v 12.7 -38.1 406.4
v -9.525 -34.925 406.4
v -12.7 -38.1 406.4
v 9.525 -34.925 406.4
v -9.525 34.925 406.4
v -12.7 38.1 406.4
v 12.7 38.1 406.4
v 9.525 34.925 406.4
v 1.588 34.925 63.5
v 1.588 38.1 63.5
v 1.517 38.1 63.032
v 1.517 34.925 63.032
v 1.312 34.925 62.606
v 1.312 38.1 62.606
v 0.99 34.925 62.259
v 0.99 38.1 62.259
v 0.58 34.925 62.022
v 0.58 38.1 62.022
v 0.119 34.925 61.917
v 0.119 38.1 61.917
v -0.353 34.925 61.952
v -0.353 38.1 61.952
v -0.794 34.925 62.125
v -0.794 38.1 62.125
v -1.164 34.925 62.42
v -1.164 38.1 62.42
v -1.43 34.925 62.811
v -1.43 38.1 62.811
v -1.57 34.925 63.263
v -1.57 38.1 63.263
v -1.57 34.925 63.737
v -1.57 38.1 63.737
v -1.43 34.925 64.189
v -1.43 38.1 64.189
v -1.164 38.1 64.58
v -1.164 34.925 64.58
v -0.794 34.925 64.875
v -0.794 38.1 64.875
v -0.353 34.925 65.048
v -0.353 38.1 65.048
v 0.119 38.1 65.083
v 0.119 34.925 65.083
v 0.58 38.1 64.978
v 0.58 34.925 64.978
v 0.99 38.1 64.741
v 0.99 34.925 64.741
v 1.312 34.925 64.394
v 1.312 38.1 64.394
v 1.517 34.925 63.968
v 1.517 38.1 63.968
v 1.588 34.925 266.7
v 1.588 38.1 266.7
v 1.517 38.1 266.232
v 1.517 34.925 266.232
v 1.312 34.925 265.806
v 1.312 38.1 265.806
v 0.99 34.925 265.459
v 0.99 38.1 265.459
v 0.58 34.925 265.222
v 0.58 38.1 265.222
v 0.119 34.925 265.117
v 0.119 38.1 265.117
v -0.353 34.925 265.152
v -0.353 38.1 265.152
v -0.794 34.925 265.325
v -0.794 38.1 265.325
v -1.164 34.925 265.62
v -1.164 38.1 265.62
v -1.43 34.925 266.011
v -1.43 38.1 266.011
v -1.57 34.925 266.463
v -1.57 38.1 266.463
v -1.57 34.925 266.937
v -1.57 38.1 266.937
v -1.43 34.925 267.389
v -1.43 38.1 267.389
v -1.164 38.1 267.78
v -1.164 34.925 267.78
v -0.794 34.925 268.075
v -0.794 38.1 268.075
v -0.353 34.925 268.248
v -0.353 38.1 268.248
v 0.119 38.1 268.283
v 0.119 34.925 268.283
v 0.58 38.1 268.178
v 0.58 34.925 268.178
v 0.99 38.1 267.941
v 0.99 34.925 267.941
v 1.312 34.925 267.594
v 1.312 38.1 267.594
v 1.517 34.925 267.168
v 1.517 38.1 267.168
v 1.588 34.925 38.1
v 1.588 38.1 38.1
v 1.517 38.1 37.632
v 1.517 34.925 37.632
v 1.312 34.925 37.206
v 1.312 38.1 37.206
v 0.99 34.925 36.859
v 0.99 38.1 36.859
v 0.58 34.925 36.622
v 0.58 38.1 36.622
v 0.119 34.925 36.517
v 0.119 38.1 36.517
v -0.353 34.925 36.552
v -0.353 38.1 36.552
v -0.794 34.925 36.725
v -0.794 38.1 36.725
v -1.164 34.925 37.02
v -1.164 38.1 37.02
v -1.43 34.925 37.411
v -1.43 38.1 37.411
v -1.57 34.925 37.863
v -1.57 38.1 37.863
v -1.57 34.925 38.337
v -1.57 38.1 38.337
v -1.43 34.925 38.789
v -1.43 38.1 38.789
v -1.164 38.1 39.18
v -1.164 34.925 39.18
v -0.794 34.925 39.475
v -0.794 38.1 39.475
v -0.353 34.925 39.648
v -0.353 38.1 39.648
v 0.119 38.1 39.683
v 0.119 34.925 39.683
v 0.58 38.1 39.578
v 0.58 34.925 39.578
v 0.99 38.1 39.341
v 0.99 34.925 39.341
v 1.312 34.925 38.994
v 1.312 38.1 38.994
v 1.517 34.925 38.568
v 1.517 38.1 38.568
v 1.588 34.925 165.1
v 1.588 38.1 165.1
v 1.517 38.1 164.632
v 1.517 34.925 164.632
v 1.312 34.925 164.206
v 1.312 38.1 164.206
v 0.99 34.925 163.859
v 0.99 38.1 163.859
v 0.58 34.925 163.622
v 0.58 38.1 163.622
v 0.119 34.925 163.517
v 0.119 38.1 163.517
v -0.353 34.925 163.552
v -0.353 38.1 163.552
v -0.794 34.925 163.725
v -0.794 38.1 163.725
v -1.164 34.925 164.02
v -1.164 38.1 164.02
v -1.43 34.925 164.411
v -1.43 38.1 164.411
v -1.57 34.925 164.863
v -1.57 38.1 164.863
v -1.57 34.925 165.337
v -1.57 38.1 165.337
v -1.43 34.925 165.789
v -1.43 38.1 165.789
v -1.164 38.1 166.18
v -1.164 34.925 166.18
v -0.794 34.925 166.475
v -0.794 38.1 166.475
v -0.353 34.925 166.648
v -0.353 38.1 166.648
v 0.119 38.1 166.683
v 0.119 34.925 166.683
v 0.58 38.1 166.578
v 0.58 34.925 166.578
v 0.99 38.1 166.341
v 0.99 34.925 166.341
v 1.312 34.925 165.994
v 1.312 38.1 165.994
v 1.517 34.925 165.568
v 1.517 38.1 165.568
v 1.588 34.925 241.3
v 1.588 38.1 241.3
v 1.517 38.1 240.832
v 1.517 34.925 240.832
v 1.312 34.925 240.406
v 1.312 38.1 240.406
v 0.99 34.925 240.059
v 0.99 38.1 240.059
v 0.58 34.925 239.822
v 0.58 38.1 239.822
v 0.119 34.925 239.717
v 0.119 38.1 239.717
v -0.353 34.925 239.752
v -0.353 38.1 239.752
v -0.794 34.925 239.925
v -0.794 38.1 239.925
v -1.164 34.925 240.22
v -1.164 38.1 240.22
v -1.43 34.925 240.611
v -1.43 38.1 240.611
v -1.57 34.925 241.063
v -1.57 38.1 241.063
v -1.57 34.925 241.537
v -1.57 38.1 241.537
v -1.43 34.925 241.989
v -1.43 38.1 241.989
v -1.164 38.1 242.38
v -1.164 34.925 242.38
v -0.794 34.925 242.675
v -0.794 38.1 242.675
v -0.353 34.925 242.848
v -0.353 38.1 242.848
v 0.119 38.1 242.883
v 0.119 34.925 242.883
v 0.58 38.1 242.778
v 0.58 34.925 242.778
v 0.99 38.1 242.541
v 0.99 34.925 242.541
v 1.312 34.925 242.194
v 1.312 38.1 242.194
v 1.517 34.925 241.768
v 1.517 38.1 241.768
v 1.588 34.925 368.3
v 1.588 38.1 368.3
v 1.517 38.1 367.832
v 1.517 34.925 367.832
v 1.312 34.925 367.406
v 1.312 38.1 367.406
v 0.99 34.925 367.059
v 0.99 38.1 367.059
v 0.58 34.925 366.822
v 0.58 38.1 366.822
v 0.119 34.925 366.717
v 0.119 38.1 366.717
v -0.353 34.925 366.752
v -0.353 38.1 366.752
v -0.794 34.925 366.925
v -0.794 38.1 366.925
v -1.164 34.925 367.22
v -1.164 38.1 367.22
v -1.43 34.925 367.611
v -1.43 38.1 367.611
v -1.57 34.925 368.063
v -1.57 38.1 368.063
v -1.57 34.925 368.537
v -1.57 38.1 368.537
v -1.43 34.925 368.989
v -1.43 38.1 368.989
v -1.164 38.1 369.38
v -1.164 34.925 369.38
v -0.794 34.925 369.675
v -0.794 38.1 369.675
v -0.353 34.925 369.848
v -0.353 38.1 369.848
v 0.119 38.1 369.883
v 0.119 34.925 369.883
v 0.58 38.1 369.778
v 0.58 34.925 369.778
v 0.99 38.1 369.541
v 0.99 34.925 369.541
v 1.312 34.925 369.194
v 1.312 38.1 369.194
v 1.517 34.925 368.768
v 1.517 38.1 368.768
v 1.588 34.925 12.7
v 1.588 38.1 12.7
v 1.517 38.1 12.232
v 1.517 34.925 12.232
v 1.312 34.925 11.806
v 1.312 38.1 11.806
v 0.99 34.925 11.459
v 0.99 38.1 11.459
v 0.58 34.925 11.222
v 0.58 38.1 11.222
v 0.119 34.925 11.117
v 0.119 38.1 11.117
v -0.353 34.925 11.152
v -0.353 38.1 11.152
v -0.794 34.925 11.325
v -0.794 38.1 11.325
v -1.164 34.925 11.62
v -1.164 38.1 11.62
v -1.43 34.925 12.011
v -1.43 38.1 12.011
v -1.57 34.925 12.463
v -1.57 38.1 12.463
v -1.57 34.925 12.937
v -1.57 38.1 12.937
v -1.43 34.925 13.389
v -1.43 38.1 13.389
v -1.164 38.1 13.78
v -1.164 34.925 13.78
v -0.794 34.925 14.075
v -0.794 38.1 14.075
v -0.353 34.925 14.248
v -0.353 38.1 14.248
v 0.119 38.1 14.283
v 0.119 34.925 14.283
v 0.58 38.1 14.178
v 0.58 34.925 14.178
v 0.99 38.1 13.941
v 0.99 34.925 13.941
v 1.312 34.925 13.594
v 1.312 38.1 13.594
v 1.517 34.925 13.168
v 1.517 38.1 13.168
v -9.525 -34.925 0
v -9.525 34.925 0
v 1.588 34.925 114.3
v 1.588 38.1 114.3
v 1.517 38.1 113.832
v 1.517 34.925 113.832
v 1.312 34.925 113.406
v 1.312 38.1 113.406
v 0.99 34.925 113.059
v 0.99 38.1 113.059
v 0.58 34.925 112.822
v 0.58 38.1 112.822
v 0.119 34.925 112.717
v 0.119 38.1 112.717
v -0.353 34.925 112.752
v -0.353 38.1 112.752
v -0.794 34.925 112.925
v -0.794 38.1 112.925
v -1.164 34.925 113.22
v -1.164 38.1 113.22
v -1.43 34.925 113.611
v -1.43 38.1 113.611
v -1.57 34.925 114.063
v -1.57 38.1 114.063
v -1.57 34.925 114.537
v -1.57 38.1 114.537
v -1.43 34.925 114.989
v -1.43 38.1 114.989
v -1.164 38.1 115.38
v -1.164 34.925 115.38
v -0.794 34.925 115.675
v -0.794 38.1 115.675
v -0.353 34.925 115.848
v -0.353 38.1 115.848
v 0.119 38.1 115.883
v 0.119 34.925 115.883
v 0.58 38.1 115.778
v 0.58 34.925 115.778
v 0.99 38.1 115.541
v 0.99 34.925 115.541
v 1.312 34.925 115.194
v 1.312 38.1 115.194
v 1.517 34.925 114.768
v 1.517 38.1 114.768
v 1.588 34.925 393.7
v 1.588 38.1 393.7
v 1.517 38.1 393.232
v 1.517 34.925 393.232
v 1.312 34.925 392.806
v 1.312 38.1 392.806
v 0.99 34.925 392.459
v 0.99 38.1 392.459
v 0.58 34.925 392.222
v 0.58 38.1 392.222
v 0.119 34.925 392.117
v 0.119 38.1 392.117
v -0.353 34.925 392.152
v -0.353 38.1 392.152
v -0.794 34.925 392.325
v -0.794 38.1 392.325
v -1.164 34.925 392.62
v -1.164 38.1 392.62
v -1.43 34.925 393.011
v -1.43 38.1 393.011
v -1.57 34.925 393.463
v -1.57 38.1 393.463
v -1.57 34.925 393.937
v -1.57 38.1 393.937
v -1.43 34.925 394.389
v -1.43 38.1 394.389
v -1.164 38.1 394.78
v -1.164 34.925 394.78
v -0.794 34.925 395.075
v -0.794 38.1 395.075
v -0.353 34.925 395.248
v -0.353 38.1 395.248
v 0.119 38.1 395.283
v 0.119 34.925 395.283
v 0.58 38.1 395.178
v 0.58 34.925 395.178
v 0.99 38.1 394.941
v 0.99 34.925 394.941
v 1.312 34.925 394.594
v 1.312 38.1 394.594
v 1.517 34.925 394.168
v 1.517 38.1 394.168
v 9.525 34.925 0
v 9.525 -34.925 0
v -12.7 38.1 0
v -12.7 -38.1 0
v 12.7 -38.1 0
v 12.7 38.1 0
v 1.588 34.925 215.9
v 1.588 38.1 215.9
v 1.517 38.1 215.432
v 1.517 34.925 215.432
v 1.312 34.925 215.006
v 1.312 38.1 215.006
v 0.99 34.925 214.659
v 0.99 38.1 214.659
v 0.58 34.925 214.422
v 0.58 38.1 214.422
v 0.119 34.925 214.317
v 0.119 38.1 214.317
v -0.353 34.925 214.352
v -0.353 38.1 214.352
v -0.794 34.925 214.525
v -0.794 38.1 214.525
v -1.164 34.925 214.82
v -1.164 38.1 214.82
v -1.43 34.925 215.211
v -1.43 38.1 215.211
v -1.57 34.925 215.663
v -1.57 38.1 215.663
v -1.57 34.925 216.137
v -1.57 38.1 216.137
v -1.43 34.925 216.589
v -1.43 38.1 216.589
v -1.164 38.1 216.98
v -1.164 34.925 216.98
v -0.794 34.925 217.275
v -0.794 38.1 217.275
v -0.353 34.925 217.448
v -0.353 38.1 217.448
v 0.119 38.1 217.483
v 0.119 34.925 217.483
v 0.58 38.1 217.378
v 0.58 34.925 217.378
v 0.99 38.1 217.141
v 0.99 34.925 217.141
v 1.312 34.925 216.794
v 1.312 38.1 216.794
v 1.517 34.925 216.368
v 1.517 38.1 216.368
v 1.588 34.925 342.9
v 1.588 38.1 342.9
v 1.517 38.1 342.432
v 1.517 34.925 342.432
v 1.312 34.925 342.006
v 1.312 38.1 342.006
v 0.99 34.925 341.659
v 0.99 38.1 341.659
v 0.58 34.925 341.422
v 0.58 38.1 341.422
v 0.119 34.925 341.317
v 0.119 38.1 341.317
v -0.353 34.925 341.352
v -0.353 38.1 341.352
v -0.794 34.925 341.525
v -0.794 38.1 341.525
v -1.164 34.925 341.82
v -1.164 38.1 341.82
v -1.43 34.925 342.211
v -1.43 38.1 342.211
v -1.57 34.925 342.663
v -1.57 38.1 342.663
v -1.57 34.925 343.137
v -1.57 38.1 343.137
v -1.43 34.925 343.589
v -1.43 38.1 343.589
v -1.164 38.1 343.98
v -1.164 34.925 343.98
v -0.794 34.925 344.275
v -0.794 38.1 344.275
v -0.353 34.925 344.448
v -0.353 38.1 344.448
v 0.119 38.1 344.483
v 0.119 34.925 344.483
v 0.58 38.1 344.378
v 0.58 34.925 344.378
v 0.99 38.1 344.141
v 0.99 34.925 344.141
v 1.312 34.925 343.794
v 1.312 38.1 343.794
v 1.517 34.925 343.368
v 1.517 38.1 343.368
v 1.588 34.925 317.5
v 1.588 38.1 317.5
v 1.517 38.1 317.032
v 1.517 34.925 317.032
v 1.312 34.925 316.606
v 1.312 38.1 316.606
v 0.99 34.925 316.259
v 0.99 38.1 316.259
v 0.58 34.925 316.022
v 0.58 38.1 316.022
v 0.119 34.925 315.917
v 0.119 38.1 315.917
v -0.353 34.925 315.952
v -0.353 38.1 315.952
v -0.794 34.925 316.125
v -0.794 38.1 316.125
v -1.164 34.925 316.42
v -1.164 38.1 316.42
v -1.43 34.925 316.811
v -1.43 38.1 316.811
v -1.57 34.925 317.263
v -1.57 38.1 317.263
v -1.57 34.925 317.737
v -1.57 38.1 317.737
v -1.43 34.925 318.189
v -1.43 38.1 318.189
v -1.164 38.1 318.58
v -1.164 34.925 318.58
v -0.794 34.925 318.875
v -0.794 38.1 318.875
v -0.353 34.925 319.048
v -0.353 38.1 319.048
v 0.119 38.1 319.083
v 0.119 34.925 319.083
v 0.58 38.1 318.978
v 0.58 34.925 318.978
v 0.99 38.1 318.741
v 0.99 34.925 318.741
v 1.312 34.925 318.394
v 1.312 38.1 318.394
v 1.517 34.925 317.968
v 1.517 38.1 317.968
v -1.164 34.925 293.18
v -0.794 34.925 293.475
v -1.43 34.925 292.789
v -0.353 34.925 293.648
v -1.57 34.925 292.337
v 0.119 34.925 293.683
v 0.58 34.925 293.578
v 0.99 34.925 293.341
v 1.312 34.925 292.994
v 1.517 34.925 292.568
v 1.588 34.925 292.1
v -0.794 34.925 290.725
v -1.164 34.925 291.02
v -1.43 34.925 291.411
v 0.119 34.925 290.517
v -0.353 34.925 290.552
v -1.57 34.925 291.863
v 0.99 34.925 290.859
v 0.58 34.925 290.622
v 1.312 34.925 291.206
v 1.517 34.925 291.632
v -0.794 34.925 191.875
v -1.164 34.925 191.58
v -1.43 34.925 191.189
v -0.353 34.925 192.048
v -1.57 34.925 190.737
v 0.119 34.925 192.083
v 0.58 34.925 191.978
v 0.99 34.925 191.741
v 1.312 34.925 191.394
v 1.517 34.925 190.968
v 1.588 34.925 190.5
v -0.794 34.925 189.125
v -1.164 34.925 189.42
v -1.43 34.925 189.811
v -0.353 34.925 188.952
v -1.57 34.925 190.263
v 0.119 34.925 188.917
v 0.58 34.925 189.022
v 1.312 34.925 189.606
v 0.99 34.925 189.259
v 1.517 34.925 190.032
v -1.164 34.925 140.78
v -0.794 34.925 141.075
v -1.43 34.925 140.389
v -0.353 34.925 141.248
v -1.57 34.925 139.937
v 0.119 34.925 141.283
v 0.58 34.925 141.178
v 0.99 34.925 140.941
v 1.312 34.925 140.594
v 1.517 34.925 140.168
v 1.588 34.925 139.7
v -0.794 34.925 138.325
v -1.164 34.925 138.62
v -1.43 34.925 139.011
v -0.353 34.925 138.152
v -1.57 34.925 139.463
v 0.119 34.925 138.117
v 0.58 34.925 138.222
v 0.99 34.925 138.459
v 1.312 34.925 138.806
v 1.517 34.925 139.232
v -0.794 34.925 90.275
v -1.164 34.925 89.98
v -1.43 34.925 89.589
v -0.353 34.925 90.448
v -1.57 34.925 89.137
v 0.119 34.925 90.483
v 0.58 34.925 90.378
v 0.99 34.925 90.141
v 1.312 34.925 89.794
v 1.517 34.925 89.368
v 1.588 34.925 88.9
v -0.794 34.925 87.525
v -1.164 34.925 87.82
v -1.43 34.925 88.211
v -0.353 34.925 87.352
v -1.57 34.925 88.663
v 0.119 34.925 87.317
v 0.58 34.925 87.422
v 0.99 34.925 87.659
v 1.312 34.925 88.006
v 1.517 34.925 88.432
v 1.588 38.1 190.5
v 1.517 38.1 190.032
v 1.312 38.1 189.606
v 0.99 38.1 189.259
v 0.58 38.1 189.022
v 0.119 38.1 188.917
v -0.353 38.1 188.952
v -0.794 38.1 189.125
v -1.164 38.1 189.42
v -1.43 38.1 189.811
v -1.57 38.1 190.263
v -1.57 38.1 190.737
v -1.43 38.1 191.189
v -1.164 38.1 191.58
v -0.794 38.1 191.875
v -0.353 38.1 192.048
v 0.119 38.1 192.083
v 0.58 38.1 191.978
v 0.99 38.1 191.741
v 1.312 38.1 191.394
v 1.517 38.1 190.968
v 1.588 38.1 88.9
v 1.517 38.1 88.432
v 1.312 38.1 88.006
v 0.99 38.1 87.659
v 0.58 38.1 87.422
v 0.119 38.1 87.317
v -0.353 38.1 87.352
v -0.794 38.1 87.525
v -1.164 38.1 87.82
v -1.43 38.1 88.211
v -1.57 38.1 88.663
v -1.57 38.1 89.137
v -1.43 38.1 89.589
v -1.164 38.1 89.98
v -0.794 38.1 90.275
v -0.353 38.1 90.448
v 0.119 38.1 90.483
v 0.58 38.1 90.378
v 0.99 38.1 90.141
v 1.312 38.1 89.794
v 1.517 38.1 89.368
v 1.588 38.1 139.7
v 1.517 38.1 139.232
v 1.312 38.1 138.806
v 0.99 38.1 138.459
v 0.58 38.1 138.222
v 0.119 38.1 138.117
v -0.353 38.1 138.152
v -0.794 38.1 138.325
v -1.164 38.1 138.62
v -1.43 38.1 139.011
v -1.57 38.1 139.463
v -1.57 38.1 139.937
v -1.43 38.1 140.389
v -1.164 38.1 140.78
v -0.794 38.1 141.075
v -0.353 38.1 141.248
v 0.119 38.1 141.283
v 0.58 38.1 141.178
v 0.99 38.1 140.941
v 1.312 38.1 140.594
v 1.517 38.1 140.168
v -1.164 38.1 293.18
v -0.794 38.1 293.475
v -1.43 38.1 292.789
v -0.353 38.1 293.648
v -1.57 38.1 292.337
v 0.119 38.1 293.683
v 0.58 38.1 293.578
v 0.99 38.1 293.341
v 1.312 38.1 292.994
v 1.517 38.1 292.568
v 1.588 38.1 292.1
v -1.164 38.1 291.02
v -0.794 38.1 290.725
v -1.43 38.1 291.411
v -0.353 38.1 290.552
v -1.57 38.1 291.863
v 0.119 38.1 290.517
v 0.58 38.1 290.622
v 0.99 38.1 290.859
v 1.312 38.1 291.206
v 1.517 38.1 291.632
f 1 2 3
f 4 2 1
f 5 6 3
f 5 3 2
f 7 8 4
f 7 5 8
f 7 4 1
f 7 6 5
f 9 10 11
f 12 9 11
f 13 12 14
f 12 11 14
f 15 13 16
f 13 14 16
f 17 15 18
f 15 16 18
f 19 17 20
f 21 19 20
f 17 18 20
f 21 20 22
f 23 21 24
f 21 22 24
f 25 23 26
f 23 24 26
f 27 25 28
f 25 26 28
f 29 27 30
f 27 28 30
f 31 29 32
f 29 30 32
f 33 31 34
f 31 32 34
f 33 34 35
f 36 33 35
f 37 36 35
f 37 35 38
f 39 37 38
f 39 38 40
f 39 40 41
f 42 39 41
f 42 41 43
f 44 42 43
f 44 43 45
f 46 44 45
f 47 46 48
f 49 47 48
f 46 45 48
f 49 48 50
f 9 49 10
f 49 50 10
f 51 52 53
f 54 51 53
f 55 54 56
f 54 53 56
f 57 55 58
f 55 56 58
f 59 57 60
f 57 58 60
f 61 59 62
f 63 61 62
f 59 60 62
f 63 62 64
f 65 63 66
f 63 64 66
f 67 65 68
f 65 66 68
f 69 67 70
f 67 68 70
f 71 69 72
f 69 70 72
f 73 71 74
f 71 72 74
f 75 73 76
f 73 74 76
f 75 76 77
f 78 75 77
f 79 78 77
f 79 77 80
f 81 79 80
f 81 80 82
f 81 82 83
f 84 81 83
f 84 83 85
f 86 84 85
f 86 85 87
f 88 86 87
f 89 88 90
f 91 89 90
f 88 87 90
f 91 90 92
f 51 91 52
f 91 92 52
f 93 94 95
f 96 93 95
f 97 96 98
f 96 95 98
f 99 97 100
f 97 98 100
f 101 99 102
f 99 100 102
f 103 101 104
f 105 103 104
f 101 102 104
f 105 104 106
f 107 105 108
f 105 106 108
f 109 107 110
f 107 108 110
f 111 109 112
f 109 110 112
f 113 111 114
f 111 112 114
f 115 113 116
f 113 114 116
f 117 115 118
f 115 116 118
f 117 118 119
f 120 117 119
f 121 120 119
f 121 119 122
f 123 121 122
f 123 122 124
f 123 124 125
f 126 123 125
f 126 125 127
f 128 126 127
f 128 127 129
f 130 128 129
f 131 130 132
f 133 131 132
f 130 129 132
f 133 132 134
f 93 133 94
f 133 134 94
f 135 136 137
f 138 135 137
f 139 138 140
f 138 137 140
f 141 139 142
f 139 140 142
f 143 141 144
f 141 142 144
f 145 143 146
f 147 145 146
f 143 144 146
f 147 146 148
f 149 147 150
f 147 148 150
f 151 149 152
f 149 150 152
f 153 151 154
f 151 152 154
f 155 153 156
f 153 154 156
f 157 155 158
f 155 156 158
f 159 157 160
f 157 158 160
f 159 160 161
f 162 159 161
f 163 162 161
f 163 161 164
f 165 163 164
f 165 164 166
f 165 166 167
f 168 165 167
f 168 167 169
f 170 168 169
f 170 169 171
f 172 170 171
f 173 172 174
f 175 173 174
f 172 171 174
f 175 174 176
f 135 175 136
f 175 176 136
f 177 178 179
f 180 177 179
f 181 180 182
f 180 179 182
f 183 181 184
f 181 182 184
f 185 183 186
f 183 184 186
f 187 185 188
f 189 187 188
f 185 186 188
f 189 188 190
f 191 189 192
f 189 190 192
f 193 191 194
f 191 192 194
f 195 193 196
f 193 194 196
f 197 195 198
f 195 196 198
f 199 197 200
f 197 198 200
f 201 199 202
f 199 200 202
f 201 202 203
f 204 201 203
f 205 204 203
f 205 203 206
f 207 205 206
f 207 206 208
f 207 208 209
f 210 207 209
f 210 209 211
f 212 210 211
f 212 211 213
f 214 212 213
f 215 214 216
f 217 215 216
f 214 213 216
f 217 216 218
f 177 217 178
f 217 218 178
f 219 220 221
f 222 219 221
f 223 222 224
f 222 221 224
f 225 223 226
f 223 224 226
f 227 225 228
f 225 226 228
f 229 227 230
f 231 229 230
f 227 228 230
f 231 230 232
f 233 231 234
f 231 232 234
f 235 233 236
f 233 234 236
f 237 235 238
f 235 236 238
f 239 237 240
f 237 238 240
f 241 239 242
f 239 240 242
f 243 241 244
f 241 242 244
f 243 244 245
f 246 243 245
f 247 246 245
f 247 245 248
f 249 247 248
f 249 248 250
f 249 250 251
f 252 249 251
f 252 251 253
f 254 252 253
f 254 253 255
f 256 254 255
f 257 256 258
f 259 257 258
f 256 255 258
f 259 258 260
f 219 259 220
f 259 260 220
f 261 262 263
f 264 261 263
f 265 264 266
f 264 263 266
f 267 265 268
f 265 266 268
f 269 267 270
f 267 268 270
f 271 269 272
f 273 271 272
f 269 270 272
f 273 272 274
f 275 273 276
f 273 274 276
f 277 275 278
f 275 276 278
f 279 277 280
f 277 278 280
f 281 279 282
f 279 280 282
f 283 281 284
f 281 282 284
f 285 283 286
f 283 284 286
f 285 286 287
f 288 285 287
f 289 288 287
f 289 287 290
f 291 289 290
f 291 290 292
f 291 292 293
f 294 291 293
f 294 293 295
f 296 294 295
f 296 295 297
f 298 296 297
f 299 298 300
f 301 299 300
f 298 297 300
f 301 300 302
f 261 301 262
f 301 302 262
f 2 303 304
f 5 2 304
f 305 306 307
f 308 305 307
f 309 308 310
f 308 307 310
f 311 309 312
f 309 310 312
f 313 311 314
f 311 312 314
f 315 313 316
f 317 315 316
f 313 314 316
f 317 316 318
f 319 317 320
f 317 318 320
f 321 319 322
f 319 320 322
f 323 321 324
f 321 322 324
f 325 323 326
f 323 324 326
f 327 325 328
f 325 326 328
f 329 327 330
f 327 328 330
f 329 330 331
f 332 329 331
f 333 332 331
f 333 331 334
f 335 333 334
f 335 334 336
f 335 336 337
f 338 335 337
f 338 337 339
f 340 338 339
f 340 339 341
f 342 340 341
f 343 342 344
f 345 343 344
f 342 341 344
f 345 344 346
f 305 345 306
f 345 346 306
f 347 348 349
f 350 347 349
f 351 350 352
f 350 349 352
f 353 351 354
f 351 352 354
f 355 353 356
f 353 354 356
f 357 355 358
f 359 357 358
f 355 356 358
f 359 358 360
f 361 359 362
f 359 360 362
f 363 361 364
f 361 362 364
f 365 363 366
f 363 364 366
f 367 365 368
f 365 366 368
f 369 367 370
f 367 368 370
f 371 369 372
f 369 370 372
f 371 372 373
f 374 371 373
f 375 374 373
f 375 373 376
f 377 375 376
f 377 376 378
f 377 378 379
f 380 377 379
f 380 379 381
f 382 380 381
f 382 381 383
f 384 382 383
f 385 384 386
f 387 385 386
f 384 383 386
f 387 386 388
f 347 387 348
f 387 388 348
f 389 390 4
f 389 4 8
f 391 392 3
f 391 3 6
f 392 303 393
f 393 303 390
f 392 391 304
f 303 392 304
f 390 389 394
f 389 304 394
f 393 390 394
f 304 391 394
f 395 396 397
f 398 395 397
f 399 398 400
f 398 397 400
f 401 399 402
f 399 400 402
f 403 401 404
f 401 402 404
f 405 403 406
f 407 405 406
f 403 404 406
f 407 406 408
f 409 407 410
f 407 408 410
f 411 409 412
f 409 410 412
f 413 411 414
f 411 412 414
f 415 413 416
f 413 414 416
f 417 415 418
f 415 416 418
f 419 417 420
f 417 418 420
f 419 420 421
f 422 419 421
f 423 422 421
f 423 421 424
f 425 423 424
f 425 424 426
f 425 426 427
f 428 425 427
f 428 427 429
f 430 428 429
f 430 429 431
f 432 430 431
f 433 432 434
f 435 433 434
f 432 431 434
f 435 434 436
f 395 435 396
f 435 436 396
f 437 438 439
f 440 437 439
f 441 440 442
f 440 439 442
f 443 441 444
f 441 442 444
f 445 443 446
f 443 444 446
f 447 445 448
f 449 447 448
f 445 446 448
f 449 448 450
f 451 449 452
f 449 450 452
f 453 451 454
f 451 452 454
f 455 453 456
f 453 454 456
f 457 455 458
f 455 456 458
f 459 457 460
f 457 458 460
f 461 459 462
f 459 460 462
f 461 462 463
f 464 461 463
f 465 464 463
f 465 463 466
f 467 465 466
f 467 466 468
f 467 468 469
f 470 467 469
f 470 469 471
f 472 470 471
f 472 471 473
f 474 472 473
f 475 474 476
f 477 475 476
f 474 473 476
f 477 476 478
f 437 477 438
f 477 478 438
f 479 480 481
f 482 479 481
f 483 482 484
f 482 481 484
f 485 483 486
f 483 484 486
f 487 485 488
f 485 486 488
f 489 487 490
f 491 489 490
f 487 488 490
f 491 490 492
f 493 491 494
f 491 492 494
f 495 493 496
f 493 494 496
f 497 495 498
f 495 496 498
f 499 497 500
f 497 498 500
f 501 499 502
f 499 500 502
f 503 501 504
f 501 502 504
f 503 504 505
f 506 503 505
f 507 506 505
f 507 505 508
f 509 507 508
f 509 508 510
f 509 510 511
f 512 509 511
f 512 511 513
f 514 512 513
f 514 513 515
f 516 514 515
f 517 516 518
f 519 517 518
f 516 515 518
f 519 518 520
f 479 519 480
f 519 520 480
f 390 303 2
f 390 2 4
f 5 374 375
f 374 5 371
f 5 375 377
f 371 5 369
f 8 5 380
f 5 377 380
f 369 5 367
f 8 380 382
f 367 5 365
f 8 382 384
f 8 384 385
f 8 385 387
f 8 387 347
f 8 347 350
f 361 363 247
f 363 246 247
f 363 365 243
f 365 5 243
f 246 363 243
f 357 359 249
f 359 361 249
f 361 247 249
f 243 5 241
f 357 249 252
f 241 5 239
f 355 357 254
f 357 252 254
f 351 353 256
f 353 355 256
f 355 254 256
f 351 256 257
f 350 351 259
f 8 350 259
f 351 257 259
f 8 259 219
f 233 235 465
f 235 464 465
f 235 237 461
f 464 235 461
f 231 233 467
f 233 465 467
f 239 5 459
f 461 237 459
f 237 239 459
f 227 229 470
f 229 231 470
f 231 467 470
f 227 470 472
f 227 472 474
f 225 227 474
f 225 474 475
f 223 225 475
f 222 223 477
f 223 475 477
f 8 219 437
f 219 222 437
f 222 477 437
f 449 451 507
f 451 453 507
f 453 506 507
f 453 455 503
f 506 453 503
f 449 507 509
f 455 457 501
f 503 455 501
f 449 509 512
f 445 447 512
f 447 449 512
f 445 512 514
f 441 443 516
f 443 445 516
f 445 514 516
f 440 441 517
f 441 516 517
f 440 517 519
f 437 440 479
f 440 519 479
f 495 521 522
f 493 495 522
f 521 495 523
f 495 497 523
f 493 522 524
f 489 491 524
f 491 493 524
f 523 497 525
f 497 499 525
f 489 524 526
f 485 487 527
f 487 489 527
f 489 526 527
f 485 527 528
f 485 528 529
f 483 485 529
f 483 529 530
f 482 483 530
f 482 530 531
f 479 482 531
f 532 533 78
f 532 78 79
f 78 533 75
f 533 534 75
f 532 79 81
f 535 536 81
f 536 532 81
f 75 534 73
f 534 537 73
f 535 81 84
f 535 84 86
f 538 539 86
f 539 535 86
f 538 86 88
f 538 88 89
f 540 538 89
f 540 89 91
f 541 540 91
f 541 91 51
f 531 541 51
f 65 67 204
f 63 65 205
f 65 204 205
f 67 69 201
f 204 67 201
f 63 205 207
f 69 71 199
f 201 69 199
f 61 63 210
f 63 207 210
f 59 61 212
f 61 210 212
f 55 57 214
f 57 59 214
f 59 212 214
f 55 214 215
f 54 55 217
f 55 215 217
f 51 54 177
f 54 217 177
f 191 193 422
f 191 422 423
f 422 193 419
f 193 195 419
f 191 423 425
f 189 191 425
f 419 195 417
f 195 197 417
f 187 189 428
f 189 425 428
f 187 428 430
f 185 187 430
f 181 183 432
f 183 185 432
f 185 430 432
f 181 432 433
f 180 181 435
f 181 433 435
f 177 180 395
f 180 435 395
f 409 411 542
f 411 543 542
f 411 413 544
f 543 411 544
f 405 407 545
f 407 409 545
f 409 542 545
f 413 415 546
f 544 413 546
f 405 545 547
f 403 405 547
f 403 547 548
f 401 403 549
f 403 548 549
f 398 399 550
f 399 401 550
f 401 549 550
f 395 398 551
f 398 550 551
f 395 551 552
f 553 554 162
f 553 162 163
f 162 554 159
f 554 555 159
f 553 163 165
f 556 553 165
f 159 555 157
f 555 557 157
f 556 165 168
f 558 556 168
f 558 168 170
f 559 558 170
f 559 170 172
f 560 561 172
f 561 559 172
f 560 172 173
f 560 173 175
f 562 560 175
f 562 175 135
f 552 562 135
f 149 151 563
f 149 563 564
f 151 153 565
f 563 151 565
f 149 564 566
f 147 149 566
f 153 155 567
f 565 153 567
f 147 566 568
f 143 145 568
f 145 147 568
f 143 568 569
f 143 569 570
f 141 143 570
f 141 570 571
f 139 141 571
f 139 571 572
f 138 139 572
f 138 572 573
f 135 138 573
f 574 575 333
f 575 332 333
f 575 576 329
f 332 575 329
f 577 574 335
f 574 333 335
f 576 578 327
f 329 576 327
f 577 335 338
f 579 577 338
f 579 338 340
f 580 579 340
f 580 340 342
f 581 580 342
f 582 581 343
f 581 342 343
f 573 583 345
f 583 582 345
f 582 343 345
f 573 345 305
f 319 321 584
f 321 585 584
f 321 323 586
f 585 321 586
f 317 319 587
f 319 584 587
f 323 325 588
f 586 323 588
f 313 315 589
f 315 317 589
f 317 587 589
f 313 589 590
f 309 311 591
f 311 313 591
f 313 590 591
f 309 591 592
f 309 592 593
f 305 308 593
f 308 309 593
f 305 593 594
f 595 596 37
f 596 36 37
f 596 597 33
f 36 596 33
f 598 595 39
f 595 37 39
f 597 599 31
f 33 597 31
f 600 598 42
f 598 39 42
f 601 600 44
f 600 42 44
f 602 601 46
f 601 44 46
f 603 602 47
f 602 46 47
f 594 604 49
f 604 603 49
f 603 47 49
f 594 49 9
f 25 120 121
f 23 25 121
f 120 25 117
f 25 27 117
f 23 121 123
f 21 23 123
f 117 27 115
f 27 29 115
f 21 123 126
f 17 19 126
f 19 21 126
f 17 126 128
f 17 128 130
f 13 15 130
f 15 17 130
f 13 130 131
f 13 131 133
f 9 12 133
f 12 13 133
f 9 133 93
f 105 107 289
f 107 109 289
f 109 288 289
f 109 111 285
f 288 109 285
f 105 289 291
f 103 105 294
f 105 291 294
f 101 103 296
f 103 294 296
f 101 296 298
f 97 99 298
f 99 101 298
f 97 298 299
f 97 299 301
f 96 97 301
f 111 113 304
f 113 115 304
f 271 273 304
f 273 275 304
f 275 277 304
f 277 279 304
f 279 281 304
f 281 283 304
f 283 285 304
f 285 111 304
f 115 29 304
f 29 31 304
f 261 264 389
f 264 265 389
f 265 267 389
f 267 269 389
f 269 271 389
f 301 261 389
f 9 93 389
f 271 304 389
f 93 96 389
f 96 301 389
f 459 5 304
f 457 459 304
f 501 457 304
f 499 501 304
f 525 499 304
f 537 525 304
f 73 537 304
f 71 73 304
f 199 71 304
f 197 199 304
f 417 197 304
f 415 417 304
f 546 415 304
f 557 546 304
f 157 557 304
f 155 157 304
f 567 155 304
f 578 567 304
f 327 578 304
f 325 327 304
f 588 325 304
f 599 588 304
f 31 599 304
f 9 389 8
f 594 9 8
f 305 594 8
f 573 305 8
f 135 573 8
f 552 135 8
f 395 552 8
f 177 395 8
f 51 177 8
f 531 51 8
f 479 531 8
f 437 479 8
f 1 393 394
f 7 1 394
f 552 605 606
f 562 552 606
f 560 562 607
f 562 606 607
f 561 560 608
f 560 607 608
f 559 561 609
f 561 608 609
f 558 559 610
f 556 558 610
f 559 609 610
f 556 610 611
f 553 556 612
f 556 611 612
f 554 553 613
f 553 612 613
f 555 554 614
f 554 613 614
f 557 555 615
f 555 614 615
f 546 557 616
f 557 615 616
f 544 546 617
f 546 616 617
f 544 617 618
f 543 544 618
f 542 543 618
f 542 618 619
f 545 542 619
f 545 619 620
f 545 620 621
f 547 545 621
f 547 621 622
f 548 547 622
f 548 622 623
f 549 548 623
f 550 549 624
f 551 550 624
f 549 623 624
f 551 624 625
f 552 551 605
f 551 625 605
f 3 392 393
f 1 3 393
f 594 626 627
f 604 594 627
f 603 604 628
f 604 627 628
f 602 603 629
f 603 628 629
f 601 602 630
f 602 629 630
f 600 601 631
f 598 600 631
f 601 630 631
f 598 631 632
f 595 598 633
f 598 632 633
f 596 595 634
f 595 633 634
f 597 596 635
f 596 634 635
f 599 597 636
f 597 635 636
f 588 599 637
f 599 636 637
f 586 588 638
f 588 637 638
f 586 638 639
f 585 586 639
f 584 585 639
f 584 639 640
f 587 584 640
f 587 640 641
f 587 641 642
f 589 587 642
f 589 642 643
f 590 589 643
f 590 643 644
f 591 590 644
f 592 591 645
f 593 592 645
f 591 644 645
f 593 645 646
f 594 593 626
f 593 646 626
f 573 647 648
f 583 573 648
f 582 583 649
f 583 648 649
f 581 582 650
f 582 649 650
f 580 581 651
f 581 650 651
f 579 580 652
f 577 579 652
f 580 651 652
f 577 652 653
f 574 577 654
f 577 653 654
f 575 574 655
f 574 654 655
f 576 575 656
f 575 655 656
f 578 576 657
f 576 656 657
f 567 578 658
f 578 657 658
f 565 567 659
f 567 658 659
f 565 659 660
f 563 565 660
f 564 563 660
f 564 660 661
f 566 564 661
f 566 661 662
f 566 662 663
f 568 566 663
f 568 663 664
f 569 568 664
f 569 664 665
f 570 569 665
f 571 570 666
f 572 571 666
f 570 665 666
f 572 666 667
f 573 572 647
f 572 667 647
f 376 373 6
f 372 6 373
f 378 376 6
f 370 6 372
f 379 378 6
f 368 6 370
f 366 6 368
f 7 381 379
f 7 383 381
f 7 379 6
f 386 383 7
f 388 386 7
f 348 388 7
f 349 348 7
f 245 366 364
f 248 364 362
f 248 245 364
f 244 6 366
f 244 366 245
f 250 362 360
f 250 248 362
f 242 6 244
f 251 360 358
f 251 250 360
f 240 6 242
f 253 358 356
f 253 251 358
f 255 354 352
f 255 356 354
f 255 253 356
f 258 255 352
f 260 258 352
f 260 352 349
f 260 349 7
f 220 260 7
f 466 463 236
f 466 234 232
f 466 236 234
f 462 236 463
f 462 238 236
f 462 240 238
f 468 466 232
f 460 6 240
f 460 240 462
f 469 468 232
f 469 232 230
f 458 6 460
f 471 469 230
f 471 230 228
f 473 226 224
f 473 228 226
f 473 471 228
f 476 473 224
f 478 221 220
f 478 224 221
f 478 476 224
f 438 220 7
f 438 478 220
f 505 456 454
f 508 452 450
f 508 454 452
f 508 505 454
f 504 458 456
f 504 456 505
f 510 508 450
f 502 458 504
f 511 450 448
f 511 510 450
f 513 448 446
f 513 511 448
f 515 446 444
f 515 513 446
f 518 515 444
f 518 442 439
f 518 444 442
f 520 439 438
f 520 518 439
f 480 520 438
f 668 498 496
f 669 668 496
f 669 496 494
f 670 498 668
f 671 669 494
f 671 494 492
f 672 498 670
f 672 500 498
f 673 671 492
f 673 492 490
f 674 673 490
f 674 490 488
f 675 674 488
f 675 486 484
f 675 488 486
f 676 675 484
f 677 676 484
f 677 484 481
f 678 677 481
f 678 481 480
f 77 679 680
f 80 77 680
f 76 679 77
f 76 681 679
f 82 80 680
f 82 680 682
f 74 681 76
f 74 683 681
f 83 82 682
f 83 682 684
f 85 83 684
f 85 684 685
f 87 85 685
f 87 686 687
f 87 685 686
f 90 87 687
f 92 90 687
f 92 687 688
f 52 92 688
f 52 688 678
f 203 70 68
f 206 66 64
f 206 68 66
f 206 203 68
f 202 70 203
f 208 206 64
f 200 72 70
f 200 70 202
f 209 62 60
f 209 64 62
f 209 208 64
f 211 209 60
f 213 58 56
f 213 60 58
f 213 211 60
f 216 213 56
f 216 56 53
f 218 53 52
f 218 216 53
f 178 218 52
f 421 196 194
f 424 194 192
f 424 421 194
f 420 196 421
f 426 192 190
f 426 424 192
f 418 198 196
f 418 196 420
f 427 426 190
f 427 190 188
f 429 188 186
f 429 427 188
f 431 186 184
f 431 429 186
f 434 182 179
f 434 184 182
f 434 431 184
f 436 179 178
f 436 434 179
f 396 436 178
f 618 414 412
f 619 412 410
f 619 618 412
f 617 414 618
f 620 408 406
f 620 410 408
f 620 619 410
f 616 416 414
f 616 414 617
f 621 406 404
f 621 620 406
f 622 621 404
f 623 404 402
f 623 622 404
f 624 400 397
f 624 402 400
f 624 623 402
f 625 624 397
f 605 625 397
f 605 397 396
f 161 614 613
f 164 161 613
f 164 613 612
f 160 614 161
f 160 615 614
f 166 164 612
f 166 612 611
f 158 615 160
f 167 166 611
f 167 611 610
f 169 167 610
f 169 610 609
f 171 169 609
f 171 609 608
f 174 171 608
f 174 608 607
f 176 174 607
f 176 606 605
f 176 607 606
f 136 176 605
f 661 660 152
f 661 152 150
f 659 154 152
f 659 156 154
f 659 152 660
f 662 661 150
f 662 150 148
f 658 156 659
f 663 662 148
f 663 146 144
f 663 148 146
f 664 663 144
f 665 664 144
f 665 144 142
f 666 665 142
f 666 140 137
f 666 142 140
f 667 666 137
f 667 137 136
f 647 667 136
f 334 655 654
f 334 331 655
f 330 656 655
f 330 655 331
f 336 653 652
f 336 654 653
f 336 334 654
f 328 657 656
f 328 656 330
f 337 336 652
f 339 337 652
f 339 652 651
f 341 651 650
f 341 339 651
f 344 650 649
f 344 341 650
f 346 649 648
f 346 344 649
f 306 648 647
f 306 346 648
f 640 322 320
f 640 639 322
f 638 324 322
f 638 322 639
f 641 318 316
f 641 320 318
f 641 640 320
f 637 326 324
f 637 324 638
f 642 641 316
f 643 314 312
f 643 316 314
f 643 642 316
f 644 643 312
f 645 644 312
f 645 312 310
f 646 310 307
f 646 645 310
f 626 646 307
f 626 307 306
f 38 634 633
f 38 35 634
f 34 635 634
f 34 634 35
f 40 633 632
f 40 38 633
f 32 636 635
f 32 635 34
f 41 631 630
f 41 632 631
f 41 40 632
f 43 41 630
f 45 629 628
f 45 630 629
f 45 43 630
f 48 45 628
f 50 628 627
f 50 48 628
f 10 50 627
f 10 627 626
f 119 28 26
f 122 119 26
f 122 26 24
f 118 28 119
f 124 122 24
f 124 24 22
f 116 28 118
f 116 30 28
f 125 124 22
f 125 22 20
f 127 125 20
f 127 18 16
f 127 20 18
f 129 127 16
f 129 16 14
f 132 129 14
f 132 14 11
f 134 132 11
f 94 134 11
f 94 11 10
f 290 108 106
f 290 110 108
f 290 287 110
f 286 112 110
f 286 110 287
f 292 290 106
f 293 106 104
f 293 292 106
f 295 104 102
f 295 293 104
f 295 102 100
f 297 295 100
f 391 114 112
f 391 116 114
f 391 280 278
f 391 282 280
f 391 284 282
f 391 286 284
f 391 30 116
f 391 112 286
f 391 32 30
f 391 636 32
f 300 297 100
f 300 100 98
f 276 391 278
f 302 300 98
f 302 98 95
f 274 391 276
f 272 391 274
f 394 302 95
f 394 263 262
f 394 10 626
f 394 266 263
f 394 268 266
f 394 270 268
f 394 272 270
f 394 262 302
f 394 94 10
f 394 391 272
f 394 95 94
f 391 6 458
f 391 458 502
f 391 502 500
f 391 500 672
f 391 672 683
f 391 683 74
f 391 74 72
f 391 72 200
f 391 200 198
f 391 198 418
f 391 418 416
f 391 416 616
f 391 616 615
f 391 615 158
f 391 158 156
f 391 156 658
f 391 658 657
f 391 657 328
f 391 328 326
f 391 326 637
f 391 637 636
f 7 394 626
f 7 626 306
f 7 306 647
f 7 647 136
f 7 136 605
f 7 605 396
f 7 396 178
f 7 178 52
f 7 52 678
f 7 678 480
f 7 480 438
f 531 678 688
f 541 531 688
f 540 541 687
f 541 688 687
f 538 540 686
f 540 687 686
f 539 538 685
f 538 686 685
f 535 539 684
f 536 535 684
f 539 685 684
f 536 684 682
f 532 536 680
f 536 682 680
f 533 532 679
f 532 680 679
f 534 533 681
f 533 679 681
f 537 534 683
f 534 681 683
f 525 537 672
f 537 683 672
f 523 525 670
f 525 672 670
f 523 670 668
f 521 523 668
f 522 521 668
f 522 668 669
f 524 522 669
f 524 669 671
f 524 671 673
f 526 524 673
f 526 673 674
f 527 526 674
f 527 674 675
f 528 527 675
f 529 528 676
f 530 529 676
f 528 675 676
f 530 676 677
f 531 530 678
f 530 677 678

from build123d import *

# Parameters (mm, degrees)
SKETCH1_W           = 25.4
SKETCH1_H           = 76.2
BOSS_EXTRUDE1_DEPTH = 406.4
SHELL1_T            = -3.175
SKETCH2_R           = 1.5875
CUT_EXTRUDE1_DEPTH  = 3.175
LPATTERN1_COUNT     = 16
LPATTERN1_PITCH     = 25.4


with BuildPart() as part:
    # Sketch1 → Boss-Extrude1 (new body)
    with BuildSketch(Plane.XY):
        Rectangle(SKETCH1_W, SKETCH1_H)
    extrude(amount=BOSS_EXTRUDE1_DEPTH)

    # Shell1
    shell1_openings = [part.faces().sort_by_distance(p)[0] for p in [
        (0, 0, 406.4),
        (0, 0, 0),
    ]]
    offset(amount=SHELL1_T, openings=shell1_openings, kind=Kind.INTERSECTION)

    # Sketch2 → Cut-Extrude1 (cut)
    with BuildSketch(Plane(origin=(0, 38.1, 0), x_dir=(1, 0, 0), z_dir=(0, 1, 0))):
        with Locations((0, -12.7)):
            Circle(SKETCH2_R)
    cut_extrude1 = extrude(amount=-CUT_EXTRUDE1_DEPTH, mode=Mode.SUBTRACT)

    # LPattern1: Cut-Extrude1 ×16
    with Locations(*[(0, 0, i * LPATTERN1_PITCH) for i in range(1, LPATTERN1_COUNT)]):
        add(cut_extrude1, mode=Mode.SUBTRACT)


solid = part.part
